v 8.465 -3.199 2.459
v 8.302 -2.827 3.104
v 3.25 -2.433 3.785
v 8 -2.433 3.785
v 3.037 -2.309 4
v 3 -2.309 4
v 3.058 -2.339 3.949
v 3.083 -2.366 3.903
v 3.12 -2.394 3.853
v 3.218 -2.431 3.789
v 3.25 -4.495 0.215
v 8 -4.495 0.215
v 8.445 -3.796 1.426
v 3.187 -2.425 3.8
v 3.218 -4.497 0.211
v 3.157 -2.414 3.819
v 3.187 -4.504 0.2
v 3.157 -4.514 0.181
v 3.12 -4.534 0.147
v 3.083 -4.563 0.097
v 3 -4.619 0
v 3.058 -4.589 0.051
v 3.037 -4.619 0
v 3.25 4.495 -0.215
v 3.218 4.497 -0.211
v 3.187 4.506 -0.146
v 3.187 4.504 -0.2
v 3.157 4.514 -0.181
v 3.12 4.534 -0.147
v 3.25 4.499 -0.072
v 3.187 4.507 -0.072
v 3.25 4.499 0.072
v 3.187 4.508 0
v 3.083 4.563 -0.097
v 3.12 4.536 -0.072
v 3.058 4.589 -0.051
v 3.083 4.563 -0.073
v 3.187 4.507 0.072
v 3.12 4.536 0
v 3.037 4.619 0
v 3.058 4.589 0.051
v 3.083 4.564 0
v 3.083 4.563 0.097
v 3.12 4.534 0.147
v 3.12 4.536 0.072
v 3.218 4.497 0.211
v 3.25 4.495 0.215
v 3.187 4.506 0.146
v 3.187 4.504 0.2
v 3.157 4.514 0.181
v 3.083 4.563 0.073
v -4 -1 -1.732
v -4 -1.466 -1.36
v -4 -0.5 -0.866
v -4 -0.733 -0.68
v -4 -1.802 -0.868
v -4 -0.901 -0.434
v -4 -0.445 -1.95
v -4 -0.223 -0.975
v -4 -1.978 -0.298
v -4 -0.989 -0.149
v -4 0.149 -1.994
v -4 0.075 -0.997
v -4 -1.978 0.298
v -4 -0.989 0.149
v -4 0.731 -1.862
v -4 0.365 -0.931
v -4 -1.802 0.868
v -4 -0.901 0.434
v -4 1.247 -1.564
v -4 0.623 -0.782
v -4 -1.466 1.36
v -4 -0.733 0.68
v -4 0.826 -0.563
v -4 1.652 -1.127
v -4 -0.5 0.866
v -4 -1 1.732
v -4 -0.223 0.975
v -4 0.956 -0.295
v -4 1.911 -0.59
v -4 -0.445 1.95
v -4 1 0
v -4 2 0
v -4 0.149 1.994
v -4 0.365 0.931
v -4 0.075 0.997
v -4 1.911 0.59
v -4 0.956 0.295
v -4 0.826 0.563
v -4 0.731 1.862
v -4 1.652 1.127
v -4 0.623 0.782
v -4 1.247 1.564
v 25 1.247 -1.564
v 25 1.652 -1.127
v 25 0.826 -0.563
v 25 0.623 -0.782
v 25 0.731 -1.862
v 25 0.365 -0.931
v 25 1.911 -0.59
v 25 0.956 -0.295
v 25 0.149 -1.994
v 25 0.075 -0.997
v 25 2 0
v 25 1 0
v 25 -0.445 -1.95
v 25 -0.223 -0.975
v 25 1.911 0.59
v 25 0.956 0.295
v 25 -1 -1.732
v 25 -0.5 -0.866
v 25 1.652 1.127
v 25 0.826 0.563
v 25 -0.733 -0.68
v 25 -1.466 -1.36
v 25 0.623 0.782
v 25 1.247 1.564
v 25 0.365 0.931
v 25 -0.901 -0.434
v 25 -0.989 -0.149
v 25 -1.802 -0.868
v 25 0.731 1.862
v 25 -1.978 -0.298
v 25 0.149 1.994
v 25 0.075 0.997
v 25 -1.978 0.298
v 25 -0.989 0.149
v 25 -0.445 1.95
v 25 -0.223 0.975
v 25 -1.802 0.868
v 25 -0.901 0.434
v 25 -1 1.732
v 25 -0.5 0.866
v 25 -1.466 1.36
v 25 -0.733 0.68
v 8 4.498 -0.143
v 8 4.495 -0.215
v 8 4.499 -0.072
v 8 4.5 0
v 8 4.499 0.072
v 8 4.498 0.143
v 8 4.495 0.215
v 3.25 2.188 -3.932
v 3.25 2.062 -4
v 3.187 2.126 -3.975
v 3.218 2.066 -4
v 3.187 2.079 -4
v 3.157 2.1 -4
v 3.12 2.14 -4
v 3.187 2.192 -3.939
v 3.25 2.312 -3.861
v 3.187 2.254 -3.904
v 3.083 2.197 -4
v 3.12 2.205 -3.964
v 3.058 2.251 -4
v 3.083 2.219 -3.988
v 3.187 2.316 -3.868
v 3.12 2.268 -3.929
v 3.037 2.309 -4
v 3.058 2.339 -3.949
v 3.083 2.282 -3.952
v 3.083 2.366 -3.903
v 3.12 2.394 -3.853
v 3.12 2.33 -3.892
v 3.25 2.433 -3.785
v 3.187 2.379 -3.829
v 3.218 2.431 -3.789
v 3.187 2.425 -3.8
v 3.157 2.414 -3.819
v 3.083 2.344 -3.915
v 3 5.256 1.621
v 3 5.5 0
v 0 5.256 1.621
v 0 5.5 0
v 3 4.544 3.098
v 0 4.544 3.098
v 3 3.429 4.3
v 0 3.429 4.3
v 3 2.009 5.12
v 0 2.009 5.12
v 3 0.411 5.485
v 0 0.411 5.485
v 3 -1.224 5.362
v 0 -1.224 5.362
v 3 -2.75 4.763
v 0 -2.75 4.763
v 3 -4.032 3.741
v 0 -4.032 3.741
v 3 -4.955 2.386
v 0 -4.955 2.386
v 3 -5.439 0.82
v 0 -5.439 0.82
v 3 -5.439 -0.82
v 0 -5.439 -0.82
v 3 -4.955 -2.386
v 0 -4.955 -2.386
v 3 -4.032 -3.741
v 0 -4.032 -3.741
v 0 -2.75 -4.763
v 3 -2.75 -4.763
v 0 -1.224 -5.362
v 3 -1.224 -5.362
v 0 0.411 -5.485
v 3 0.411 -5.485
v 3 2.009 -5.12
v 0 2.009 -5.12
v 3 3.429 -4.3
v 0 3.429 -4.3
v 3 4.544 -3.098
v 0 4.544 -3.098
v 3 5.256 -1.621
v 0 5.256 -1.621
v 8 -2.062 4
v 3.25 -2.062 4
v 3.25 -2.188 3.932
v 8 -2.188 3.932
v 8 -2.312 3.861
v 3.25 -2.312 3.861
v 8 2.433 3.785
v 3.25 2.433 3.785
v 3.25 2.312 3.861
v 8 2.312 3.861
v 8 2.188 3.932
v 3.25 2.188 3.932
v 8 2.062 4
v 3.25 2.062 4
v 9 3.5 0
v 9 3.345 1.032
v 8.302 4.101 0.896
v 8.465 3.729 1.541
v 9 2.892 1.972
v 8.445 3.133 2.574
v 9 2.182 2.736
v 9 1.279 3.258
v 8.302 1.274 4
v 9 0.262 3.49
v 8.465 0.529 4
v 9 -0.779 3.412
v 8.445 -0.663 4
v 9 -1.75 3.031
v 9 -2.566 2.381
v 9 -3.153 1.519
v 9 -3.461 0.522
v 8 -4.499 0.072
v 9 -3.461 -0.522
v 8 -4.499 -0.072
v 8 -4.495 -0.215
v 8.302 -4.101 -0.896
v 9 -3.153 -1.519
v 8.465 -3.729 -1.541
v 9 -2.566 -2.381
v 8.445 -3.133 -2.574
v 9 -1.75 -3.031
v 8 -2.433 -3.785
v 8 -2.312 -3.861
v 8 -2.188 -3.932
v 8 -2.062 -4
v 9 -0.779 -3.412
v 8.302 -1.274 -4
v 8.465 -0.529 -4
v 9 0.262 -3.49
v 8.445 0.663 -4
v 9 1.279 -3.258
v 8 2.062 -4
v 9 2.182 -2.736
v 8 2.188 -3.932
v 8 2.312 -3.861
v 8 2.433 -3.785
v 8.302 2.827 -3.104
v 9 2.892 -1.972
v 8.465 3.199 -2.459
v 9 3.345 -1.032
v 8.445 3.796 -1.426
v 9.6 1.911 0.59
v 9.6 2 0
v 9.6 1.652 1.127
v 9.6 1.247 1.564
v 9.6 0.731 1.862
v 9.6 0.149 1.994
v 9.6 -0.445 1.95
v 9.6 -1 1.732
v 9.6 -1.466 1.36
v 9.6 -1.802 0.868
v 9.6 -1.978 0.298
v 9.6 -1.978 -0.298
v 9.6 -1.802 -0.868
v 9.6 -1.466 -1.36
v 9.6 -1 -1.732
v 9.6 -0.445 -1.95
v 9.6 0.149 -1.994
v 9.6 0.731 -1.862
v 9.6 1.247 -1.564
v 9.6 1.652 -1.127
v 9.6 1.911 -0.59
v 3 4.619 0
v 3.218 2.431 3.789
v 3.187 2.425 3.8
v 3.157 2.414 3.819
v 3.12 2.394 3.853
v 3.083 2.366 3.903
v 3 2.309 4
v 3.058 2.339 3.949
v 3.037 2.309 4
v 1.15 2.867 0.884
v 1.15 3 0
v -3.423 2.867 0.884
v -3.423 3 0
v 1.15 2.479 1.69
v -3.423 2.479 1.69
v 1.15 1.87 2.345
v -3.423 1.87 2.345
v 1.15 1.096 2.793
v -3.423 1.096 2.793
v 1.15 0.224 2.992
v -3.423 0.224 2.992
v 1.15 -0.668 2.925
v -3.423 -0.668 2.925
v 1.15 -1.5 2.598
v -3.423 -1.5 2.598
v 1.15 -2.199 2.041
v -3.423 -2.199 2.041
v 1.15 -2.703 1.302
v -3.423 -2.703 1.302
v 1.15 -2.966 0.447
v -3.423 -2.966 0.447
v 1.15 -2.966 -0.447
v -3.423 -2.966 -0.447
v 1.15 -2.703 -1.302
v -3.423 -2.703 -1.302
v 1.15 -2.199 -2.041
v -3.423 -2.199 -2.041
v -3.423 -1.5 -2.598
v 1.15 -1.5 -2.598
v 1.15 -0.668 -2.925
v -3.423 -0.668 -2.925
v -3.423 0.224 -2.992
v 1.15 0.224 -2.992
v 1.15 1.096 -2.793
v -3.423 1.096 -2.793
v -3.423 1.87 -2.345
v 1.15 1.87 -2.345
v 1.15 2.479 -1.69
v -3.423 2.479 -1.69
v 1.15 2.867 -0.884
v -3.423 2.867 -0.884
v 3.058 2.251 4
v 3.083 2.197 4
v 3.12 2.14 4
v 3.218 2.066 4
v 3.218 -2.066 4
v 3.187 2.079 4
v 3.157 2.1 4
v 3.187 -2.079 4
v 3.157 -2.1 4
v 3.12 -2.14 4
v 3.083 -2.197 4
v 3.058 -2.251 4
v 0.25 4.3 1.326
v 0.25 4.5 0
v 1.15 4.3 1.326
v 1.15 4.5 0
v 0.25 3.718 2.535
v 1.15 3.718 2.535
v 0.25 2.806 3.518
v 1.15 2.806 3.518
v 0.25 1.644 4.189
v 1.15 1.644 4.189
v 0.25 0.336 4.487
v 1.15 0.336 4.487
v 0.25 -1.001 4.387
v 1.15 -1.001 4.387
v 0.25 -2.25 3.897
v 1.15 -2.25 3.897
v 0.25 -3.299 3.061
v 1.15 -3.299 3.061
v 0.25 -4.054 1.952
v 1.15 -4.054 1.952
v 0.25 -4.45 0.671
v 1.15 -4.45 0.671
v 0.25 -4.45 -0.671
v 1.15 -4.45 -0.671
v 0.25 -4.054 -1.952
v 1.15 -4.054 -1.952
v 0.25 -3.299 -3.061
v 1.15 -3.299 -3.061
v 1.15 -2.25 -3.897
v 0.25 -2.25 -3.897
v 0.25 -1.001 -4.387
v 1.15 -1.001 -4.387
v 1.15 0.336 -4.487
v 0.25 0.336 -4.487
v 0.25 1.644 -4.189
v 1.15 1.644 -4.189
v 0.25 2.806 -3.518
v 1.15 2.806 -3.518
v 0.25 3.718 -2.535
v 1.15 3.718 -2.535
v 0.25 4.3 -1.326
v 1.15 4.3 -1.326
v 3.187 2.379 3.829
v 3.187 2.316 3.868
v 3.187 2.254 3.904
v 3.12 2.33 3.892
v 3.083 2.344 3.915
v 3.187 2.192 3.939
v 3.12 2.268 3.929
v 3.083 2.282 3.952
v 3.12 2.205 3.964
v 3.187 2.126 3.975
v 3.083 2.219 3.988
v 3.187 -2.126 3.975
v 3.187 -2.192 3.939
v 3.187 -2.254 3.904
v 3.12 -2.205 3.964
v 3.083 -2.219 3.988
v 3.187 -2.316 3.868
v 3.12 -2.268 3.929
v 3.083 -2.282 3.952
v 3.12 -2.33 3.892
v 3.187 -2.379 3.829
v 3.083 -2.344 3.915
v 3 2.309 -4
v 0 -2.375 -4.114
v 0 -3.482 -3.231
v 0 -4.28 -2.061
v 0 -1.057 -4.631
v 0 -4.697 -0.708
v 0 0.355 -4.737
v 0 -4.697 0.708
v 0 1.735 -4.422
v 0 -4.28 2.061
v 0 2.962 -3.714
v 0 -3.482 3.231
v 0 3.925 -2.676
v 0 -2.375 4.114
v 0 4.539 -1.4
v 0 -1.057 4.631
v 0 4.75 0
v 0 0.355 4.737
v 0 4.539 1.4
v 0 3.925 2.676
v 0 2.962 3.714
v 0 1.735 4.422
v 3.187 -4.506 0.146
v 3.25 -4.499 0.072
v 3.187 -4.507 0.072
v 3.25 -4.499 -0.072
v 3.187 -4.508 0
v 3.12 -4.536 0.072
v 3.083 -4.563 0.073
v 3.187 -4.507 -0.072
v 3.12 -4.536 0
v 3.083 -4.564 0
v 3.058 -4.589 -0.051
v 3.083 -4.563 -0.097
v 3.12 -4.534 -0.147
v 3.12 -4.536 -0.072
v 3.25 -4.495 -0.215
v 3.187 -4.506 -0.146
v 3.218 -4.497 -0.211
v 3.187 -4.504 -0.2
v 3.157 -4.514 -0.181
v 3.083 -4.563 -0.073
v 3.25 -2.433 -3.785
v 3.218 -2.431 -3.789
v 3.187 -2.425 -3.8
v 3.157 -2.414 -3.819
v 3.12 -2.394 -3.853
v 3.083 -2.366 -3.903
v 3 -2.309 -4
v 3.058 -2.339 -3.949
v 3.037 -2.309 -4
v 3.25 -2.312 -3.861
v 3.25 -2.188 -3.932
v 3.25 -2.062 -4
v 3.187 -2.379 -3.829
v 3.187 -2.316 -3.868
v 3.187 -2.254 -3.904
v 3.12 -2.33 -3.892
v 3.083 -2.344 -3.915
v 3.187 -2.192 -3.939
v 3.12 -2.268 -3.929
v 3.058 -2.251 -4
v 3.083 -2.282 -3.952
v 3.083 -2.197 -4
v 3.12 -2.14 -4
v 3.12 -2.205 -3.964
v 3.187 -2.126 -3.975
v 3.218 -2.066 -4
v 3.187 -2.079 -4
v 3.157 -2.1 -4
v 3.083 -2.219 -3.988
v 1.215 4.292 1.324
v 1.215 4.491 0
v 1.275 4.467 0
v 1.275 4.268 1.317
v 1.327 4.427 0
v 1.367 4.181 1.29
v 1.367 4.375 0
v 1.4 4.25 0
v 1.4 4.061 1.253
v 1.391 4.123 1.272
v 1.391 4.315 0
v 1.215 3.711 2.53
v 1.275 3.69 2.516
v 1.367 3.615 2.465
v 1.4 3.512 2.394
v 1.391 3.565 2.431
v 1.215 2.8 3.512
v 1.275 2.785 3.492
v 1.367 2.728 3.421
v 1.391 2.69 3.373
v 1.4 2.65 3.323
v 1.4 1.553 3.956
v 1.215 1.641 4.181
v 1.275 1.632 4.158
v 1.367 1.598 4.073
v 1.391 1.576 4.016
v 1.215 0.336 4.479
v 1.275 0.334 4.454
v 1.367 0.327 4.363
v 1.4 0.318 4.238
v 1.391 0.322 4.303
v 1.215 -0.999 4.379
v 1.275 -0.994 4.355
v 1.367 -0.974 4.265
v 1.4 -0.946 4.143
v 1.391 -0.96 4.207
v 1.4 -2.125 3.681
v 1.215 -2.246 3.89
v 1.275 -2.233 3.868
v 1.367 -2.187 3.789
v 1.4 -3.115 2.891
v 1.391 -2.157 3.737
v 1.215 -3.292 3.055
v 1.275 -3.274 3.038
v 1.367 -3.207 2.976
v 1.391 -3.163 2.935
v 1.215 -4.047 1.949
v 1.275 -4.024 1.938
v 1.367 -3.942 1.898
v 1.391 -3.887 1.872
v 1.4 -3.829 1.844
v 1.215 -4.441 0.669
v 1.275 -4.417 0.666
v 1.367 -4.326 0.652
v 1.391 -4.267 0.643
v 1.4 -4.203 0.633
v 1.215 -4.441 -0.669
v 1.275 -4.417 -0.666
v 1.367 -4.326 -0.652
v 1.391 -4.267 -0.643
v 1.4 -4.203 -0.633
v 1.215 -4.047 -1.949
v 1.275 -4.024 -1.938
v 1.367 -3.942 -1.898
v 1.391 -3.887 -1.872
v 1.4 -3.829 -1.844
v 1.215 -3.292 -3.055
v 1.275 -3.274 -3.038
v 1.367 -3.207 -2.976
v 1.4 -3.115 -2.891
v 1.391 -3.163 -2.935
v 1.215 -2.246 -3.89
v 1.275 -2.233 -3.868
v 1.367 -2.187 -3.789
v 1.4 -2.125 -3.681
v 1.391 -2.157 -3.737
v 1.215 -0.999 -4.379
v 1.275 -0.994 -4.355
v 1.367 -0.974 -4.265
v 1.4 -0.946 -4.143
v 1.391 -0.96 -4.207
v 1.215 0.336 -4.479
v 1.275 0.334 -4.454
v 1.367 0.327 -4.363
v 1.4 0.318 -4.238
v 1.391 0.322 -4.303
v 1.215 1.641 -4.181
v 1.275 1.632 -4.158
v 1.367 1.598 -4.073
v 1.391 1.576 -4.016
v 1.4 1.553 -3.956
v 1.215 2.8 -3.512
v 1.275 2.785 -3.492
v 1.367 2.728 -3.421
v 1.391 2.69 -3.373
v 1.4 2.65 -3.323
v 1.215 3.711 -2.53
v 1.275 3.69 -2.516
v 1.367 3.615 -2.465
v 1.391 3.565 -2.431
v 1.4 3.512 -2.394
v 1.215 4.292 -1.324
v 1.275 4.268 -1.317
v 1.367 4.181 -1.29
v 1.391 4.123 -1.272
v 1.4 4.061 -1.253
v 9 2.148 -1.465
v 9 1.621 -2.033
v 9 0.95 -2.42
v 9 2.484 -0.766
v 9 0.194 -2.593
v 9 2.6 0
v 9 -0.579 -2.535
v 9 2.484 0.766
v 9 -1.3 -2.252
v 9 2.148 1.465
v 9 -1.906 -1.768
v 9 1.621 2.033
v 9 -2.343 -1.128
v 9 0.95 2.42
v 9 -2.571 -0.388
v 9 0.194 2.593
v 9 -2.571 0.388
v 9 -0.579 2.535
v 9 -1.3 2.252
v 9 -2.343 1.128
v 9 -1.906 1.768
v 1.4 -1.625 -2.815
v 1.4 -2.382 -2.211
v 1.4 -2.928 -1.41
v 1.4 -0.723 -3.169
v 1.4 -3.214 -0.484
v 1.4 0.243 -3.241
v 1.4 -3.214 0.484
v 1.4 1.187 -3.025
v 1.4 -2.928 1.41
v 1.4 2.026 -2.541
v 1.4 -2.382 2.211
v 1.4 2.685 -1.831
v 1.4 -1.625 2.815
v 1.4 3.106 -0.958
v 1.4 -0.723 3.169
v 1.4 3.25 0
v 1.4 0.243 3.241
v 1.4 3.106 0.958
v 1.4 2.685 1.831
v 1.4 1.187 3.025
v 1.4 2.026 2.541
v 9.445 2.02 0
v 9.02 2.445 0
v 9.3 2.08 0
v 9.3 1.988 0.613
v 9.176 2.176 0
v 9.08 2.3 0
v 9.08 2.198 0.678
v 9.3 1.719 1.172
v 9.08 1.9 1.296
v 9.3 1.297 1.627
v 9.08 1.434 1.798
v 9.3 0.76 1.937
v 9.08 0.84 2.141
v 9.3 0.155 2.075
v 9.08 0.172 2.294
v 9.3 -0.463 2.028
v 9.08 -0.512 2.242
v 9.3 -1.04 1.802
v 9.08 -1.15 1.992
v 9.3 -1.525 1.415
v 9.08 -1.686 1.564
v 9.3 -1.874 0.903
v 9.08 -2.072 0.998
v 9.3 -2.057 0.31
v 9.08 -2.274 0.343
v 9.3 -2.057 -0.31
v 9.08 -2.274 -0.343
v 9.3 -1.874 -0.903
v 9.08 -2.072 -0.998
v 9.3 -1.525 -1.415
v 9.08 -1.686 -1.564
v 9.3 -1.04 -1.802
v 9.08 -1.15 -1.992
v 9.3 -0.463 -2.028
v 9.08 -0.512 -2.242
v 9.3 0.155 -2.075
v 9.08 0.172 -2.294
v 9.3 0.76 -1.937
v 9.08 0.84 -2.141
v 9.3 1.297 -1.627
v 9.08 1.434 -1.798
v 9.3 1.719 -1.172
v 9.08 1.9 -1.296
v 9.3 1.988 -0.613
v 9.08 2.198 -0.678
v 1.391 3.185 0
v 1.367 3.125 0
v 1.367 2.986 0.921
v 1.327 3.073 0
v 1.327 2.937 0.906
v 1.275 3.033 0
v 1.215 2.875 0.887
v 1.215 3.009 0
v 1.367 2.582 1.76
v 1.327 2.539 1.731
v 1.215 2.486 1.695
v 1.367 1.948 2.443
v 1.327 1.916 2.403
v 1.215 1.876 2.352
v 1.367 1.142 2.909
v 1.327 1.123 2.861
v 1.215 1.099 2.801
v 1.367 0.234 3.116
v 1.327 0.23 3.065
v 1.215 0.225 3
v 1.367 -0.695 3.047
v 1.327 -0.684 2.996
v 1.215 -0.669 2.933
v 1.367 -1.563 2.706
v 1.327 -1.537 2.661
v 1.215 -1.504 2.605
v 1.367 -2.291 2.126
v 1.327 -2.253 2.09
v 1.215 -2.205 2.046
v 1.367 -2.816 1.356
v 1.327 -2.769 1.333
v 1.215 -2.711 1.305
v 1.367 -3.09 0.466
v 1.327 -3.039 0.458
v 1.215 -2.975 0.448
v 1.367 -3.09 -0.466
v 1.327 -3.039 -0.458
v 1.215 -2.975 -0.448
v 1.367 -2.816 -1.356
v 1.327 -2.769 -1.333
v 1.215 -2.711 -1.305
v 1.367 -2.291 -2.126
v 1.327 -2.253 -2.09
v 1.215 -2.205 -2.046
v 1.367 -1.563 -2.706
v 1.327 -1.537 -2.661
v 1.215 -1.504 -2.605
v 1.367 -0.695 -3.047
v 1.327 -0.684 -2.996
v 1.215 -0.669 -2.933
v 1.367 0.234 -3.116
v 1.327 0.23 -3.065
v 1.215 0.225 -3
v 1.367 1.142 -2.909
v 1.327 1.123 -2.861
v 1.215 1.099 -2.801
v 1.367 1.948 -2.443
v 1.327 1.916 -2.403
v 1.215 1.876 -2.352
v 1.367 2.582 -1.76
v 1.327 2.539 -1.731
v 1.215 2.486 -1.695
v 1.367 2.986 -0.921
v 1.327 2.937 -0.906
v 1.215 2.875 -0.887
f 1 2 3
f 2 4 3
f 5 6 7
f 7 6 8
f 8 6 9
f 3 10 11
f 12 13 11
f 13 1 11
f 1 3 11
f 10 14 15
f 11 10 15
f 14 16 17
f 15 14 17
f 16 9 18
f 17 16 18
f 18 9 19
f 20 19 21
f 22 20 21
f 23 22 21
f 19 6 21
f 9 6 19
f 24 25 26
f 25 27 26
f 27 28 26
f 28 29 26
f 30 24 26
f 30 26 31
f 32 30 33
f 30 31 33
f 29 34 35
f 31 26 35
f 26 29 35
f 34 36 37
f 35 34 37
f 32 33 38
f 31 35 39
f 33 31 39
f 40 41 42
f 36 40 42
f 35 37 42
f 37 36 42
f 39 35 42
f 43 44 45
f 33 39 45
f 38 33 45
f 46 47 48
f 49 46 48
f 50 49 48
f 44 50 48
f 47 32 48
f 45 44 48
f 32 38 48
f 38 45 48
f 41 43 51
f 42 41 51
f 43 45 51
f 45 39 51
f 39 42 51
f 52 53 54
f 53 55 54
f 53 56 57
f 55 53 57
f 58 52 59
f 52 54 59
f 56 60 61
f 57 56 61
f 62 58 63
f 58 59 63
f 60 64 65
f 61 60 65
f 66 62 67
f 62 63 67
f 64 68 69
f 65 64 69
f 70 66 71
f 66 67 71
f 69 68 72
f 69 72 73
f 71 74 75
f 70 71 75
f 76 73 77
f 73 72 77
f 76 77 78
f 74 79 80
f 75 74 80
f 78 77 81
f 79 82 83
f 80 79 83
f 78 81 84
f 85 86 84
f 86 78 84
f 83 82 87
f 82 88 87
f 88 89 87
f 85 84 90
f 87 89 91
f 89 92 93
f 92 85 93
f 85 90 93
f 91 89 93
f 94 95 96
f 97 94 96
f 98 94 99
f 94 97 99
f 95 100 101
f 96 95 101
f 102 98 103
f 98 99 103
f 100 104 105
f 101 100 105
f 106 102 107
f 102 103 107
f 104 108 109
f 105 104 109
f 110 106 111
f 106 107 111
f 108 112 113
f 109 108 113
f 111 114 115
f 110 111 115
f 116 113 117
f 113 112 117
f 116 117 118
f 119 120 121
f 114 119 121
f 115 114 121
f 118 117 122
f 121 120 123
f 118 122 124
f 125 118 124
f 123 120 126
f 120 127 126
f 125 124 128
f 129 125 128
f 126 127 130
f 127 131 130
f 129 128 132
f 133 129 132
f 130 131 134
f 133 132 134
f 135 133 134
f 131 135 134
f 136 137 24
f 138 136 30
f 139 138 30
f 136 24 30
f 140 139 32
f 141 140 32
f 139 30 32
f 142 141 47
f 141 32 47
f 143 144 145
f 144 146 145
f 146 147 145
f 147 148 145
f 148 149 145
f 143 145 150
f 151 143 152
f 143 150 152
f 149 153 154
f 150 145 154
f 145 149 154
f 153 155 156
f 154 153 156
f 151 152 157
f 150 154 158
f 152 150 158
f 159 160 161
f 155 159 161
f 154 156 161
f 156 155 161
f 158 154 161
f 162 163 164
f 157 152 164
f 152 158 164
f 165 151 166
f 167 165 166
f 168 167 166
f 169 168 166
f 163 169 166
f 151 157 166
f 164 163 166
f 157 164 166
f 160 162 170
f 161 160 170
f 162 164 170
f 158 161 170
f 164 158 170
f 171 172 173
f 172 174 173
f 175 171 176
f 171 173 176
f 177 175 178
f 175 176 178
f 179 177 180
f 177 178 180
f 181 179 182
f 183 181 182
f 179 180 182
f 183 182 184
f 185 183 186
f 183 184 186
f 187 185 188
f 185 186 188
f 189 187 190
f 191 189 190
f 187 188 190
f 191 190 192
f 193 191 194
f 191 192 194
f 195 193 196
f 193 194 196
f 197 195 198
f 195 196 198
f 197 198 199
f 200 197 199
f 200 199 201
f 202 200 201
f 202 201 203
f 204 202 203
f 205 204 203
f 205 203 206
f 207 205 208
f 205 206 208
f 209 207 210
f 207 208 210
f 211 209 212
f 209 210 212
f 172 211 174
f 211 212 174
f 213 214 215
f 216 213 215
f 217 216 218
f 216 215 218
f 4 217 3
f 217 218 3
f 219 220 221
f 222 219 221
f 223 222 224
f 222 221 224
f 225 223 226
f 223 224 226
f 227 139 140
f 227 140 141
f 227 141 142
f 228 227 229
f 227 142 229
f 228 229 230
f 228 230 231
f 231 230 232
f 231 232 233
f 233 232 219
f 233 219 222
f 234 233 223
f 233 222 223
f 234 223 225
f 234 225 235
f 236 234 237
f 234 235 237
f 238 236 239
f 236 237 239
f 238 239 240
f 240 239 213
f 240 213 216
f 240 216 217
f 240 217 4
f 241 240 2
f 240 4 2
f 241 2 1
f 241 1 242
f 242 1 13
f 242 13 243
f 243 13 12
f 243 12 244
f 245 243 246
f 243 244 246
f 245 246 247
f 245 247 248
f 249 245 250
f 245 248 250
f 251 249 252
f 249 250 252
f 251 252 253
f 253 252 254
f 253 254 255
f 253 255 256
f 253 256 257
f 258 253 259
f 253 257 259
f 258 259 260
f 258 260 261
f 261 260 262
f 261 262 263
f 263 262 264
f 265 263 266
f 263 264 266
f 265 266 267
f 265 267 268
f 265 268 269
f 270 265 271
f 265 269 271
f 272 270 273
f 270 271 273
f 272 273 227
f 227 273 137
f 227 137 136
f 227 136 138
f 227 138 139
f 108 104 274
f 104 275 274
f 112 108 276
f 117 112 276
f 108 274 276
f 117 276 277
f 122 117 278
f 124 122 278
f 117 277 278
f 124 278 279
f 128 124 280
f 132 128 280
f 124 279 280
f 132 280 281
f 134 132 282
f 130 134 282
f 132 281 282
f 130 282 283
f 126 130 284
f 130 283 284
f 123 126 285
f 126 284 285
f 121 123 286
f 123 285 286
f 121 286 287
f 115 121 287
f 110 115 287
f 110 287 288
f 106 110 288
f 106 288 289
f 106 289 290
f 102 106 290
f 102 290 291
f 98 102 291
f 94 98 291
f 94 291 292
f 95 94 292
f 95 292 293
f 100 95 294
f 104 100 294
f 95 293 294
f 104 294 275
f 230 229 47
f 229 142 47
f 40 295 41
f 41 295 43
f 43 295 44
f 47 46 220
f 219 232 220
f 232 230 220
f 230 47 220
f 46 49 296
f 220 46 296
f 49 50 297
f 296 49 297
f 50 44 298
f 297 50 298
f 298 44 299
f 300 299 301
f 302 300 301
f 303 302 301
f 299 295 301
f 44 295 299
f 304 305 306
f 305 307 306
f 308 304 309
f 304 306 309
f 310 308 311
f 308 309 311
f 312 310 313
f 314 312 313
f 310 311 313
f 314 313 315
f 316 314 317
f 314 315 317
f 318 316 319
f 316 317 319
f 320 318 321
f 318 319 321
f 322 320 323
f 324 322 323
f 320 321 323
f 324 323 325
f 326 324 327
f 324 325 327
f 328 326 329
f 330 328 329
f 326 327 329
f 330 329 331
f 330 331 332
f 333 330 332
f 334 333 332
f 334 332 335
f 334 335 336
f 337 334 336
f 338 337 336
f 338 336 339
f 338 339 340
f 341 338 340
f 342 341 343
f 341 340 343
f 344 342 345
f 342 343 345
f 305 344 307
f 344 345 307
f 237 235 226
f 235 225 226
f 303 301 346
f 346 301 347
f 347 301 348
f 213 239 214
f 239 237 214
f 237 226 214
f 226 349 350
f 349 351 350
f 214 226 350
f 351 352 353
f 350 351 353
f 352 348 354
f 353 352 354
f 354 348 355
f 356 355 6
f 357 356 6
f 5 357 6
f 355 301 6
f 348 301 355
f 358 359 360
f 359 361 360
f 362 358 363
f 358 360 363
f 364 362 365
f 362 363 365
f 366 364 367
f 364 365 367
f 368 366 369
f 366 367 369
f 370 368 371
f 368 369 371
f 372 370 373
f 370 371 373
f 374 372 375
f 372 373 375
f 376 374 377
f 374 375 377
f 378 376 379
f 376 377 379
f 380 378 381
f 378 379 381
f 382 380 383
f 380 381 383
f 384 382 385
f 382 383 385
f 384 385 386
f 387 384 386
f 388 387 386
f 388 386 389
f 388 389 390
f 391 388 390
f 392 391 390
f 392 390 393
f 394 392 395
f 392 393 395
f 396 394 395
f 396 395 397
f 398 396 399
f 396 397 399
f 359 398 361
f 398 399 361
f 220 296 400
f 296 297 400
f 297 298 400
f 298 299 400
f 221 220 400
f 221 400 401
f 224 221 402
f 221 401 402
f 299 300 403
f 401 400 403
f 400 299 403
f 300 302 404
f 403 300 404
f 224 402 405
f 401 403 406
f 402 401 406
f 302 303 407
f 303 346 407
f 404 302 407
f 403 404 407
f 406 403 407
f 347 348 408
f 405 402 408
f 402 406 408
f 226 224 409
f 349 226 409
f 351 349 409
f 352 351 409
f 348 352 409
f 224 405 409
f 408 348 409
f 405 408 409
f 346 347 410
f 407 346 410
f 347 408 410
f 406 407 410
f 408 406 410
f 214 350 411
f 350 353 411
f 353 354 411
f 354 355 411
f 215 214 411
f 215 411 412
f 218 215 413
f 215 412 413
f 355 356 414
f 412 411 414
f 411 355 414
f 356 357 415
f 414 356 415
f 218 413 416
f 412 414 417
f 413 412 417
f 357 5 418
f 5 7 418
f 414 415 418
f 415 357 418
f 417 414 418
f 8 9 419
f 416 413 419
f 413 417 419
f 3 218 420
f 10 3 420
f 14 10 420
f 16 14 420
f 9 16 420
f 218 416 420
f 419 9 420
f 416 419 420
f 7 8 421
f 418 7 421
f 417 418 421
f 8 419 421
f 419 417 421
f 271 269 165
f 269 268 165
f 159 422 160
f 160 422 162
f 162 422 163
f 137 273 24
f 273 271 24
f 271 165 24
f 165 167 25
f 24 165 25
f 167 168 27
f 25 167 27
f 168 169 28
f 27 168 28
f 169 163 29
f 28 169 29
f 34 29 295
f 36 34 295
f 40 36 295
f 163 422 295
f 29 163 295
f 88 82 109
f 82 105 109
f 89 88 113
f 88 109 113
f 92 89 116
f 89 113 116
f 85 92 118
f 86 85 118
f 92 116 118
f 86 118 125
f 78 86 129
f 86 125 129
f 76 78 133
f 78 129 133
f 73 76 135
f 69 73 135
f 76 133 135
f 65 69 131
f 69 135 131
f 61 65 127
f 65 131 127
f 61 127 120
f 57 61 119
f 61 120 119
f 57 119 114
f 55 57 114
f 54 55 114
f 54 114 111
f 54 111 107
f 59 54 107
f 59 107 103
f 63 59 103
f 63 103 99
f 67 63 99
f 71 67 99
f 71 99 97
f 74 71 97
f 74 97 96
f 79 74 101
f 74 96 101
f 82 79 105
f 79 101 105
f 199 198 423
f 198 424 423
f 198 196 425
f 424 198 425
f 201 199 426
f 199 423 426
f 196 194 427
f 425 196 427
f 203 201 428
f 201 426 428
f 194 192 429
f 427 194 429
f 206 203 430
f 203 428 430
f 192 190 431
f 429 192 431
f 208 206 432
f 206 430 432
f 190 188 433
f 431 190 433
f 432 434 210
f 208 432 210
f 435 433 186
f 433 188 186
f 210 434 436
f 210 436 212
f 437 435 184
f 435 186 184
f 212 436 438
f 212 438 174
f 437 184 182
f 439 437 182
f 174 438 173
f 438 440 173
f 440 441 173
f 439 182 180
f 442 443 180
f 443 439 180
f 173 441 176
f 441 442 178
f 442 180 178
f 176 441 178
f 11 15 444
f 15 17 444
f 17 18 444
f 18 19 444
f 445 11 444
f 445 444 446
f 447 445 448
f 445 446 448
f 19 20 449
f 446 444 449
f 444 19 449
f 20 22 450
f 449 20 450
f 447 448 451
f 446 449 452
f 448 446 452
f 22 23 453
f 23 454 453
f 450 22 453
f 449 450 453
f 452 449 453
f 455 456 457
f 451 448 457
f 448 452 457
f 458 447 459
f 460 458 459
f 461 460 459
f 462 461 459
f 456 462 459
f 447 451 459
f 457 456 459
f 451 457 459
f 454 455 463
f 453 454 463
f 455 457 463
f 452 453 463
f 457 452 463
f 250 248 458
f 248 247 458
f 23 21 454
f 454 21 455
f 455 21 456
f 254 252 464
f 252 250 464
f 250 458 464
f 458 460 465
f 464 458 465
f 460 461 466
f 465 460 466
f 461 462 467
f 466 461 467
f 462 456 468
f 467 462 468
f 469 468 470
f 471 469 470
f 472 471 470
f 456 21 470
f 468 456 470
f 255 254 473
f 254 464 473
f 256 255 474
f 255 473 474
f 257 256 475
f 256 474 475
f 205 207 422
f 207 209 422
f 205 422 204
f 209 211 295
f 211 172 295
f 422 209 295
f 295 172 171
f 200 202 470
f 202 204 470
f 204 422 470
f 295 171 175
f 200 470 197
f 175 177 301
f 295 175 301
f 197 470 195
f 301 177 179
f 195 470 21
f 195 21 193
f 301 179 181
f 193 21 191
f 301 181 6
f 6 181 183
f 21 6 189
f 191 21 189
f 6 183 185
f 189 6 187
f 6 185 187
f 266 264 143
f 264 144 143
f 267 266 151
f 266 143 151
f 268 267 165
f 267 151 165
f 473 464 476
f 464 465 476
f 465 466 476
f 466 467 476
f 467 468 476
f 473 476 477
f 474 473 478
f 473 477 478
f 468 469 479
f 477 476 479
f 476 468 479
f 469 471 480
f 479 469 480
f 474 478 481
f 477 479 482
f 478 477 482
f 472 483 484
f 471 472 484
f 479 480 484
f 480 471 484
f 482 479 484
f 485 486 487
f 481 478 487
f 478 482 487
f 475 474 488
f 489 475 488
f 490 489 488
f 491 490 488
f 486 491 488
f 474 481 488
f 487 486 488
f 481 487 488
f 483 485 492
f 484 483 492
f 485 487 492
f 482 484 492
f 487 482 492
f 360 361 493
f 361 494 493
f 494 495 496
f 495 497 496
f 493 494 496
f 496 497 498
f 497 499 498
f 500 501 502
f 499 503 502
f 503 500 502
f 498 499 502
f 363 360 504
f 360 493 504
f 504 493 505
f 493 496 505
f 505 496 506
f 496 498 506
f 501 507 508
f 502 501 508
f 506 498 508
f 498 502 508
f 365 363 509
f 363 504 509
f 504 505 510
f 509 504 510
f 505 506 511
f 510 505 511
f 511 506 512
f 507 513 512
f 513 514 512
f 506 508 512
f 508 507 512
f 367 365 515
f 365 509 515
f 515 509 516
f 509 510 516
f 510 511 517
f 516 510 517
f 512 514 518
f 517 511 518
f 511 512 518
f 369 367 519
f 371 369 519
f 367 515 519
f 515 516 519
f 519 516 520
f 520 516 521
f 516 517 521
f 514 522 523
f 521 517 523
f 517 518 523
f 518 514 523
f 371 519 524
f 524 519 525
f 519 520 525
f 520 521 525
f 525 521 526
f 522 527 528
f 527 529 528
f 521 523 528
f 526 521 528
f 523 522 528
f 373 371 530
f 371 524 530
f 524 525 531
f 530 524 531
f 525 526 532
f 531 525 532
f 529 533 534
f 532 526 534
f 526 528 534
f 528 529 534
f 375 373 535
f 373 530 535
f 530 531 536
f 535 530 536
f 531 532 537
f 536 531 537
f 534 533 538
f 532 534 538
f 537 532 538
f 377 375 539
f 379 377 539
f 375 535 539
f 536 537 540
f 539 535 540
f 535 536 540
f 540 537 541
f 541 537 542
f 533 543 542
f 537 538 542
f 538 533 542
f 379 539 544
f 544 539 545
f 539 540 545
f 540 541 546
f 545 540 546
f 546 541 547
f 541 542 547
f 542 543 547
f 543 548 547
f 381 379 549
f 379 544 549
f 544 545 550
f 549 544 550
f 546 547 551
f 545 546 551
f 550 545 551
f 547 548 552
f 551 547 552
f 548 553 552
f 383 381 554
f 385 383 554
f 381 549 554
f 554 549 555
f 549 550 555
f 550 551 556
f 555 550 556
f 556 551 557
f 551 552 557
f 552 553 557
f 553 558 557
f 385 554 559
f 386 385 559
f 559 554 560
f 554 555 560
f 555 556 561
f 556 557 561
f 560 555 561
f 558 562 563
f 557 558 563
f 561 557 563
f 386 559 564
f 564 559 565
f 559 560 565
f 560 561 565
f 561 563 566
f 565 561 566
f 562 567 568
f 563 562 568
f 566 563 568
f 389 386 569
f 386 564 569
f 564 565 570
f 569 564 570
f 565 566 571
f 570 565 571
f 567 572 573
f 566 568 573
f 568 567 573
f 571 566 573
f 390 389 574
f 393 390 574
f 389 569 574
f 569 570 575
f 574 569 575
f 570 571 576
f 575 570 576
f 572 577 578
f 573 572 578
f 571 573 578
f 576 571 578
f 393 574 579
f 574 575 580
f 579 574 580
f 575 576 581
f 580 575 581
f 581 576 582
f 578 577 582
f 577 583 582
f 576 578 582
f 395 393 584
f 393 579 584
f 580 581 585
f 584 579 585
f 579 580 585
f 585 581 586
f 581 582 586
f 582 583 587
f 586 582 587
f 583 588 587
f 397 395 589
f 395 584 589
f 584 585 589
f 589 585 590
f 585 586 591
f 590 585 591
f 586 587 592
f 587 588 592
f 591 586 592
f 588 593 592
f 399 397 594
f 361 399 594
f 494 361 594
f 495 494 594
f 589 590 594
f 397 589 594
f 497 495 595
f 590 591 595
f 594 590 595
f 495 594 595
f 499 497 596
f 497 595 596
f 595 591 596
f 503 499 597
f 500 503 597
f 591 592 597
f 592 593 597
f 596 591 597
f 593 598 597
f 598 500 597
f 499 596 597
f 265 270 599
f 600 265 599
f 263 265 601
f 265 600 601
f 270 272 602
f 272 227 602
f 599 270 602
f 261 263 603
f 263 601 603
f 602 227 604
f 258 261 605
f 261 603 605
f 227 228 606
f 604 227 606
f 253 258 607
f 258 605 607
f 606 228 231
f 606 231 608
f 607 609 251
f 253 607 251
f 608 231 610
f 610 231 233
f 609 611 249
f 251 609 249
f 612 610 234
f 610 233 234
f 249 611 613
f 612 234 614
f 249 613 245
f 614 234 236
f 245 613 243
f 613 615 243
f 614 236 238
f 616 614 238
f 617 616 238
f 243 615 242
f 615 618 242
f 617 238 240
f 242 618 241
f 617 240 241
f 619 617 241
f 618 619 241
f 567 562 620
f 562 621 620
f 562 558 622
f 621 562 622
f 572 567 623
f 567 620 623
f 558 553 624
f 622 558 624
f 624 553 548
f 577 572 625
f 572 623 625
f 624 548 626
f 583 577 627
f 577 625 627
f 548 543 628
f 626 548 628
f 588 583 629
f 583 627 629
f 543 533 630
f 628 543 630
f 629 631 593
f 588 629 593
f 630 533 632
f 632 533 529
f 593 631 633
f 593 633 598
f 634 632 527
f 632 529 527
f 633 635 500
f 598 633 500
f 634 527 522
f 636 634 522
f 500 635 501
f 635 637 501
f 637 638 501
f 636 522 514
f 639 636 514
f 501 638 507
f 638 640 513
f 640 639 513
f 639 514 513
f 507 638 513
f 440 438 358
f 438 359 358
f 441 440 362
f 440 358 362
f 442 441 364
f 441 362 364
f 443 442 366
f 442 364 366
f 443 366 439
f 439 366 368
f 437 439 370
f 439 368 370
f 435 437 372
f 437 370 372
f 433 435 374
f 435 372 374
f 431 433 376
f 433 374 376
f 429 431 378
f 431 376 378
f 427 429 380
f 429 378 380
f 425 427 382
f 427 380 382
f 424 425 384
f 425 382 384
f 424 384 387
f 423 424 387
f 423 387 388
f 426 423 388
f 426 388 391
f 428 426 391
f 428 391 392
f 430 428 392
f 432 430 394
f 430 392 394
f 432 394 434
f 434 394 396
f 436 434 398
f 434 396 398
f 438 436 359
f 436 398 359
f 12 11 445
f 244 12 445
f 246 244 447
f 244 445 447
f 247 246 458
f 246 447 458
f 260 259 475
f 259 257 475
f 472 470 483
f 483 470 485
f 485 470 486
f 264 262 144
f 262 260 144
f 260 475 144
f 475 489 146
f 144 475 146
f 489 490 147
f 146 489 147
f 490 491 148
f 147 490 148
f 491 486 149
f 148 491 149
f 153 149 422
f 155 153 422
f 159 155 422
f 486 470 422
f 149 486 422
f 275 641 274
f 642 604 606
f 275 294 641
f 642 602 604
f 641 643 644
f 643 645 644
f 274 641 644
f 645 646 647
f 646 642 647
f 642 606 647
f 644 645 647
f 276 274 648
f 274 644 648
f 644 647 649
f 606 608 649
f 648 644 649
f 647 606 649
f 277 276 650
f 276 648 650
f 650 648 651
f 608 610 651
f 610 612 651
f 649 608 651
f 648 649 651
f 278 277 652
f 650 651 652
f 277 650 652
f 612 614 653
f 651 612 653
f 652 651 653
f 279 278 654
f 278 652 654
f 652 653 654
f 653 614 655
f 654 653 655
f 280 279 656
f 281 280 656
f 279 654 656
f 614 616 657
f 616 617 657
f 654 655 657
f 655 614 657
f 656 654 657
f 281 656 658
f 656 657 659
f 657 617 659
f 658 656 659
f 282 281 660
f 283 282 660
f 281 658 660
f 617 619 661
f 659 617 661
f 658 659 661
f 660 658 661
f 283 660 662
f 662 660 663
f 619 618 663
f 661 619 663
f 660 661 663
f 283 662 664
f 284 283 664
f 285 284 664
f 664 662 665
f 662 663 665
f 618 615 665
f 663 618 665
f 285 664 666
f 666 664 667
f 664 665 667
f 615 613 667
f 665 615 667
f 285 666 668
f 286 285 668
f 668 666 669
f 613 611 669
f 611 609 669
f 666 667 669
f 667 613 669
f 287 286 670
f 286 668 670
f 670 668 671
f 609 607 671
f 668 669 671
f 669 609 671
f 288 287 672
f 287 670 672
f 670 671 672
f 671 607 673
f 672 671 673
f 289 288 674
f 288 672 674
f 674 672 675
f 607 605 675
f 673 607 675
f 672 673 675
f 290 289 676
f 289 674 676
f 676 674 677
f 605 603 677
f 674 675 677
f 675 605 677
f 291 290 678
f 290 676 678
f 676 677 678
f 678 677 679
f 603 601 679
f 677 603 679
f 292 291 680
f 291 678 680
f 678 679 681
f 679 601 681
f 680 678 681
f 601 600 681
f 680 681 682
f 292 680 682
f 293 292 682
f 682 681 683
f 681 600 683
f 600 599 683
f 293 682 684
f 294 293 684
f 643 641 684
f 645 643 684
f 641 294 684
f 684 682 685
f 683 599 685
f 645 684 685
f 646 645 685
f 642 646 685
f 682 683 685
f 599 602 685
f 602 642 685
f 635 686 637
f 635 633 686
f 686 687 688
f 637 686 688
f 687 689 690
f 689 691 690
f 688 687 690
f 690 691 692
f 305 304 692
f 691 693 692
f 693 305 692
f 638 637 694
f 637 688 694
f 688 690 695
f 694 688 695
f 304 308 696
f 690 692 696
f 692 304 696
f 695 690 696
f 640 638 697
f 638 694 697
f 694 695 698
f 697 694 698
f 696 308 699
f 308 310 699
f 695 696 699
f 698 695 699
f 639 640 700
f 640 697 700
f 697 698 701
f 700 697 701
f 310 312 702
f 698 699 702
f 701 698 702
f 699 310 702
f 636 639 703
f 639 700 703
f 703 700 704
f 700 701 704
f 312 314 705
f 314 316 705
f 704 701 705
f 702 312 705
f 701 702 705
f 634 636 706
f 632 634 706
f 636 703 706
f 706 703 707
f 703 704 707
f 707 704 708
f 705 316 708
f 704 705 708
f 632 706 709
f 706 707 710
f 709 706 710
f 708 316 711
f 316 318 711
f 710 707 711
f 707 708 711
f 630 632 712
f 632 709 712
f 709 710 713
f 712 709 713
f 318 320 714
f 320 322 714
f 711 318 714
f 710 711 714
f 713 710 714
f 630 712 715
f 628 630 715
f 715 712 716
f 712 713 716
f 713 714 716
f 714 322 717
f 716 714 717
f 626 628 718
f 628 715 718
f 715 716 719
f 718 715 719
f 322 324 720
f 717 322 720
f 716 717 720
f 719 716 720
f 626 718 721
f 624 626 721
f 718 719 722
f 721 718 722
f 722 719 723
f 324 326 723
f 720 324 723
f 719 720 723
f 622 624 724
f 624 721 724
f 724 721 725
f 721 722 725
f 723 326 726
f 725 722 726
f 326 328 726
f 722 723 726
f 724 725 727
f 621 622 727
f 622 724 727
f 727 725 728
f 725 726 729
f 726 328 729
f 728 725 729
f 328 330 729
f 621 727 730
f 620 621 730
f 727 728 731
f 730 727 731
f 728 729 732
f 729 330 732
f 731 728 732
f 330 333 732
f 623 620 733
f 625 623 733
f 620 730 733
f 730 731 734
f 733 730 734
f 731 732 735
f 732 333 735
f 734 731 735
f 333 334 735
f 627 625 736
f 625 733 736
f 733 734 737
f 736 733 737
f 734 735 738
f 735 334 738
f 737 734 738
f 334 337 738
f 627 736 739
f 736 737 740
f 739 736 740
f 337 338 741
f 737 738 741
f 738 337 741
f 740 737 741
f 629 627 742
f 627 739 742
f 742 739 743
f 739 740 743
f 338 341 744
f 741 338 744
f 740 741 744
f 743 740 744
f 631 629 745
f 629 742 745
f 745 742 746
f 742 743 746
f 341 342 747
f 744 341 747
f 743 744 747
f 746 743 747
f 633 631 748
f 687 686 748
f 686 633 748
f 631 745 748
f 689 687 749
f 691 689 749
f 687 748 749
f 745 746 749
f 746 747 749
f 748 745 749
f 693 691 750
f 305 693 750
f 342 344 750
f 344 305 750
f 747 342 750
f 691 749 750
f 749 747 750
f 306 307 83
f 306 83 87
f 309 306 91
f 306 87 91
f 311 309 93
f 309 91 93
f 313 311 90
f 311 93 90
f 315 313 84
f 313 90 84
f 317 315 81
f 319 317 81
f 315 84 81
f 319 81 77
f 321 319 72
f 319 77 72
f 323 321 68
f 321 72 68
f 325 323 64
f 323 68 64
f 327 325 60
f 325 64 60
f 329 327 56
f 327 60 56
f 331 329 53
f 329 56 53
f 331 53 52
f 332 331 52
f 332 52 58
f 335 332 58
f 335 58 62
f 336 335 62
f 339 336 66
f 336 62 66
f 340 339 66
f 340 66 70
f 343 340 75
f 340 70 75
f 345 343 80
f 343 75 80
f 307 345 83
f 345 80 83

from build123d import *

# Parameters (mm, degrees)
CUT_EXTRUDE1_START = 3
SKETCH2_OUTSIDE_W  = 19.582
SKETCH2_OUTSIDE_H  = 19.582
CUT_EXTRUDE1_DEPTH = 10


with BuildPart() as part:
    # Sketch1 → Revolve1 (revolve)
    with BuildSketch(Plane.XY):
        with BuildLine():
            Line((0, 5.5), (0, 4.75))
            Line((0, 4.75), (0.25, 4.5))
            Line((0.25, 4.5), (1.15, 4.5))
            ThreePointArc((1.15, 4.5), (1.326776695, 4.426776695), (1.4, 4.25))
            Line((1.4, 4.25), (1.4, 3.25))
            ThreePointArc((1.4, 3.25), (1.326776695, 3.073223305), (1.15, 3))
            Line((1.15, 3), (-3.422649731, 3))
            Line((-3.422649731, 3), (-4, 2))
            Line((-4, 2), (-4, 1))
            Line((-4, 1), (25, 1))
            Line((25, 1), (25, 2))
            Line((25, 2), (9.6, 2))
            ThreePointArc((9.6, 2), (9.175735931, 2.175735931), (9, 2.6))
            Line((9, 2.6), (9, 3.5))
            Line((9, 3.5), (8, 4.5))
            Line((8, 4.5), (3.25, 4.5))
            ThreePointArc((3.25, 4.5), (3.073223305, 4.573223305), (3, 4.75))
            Line((3, 4.75), (3, 5.5))
            Line((3, 5.5), (0, 5.5))
        make_face()
    revolve(axis=Axis((-88.99, 0, 0), (1, 0, 0)))

    # Sketch2 outside → Cut-Extrude1 (cut)
    with BuildSketch(Plane(origin=(0, 0, 0), x_dir=(0, 0, -1), z_dir=(1, 0, 0)).offset(CUT_EXTRUDE1_START)):
        Rectangle(SKETCH2_OUTSIDE_W, SKETCH2_OUTSIDE_H)
        Polygon((0, 4.618802154), (-4, 2.309401077), (-4, -2.309401077), (0, -4.618802154), (4, -2.309401077), (4, 2.309401077), align=None, mode=Mode.SUBTRACT)
    extrude(amount=CUT_EXTRUDE1_DEPTH, mode=Mode.SUBTRACT)


solid = part.part
